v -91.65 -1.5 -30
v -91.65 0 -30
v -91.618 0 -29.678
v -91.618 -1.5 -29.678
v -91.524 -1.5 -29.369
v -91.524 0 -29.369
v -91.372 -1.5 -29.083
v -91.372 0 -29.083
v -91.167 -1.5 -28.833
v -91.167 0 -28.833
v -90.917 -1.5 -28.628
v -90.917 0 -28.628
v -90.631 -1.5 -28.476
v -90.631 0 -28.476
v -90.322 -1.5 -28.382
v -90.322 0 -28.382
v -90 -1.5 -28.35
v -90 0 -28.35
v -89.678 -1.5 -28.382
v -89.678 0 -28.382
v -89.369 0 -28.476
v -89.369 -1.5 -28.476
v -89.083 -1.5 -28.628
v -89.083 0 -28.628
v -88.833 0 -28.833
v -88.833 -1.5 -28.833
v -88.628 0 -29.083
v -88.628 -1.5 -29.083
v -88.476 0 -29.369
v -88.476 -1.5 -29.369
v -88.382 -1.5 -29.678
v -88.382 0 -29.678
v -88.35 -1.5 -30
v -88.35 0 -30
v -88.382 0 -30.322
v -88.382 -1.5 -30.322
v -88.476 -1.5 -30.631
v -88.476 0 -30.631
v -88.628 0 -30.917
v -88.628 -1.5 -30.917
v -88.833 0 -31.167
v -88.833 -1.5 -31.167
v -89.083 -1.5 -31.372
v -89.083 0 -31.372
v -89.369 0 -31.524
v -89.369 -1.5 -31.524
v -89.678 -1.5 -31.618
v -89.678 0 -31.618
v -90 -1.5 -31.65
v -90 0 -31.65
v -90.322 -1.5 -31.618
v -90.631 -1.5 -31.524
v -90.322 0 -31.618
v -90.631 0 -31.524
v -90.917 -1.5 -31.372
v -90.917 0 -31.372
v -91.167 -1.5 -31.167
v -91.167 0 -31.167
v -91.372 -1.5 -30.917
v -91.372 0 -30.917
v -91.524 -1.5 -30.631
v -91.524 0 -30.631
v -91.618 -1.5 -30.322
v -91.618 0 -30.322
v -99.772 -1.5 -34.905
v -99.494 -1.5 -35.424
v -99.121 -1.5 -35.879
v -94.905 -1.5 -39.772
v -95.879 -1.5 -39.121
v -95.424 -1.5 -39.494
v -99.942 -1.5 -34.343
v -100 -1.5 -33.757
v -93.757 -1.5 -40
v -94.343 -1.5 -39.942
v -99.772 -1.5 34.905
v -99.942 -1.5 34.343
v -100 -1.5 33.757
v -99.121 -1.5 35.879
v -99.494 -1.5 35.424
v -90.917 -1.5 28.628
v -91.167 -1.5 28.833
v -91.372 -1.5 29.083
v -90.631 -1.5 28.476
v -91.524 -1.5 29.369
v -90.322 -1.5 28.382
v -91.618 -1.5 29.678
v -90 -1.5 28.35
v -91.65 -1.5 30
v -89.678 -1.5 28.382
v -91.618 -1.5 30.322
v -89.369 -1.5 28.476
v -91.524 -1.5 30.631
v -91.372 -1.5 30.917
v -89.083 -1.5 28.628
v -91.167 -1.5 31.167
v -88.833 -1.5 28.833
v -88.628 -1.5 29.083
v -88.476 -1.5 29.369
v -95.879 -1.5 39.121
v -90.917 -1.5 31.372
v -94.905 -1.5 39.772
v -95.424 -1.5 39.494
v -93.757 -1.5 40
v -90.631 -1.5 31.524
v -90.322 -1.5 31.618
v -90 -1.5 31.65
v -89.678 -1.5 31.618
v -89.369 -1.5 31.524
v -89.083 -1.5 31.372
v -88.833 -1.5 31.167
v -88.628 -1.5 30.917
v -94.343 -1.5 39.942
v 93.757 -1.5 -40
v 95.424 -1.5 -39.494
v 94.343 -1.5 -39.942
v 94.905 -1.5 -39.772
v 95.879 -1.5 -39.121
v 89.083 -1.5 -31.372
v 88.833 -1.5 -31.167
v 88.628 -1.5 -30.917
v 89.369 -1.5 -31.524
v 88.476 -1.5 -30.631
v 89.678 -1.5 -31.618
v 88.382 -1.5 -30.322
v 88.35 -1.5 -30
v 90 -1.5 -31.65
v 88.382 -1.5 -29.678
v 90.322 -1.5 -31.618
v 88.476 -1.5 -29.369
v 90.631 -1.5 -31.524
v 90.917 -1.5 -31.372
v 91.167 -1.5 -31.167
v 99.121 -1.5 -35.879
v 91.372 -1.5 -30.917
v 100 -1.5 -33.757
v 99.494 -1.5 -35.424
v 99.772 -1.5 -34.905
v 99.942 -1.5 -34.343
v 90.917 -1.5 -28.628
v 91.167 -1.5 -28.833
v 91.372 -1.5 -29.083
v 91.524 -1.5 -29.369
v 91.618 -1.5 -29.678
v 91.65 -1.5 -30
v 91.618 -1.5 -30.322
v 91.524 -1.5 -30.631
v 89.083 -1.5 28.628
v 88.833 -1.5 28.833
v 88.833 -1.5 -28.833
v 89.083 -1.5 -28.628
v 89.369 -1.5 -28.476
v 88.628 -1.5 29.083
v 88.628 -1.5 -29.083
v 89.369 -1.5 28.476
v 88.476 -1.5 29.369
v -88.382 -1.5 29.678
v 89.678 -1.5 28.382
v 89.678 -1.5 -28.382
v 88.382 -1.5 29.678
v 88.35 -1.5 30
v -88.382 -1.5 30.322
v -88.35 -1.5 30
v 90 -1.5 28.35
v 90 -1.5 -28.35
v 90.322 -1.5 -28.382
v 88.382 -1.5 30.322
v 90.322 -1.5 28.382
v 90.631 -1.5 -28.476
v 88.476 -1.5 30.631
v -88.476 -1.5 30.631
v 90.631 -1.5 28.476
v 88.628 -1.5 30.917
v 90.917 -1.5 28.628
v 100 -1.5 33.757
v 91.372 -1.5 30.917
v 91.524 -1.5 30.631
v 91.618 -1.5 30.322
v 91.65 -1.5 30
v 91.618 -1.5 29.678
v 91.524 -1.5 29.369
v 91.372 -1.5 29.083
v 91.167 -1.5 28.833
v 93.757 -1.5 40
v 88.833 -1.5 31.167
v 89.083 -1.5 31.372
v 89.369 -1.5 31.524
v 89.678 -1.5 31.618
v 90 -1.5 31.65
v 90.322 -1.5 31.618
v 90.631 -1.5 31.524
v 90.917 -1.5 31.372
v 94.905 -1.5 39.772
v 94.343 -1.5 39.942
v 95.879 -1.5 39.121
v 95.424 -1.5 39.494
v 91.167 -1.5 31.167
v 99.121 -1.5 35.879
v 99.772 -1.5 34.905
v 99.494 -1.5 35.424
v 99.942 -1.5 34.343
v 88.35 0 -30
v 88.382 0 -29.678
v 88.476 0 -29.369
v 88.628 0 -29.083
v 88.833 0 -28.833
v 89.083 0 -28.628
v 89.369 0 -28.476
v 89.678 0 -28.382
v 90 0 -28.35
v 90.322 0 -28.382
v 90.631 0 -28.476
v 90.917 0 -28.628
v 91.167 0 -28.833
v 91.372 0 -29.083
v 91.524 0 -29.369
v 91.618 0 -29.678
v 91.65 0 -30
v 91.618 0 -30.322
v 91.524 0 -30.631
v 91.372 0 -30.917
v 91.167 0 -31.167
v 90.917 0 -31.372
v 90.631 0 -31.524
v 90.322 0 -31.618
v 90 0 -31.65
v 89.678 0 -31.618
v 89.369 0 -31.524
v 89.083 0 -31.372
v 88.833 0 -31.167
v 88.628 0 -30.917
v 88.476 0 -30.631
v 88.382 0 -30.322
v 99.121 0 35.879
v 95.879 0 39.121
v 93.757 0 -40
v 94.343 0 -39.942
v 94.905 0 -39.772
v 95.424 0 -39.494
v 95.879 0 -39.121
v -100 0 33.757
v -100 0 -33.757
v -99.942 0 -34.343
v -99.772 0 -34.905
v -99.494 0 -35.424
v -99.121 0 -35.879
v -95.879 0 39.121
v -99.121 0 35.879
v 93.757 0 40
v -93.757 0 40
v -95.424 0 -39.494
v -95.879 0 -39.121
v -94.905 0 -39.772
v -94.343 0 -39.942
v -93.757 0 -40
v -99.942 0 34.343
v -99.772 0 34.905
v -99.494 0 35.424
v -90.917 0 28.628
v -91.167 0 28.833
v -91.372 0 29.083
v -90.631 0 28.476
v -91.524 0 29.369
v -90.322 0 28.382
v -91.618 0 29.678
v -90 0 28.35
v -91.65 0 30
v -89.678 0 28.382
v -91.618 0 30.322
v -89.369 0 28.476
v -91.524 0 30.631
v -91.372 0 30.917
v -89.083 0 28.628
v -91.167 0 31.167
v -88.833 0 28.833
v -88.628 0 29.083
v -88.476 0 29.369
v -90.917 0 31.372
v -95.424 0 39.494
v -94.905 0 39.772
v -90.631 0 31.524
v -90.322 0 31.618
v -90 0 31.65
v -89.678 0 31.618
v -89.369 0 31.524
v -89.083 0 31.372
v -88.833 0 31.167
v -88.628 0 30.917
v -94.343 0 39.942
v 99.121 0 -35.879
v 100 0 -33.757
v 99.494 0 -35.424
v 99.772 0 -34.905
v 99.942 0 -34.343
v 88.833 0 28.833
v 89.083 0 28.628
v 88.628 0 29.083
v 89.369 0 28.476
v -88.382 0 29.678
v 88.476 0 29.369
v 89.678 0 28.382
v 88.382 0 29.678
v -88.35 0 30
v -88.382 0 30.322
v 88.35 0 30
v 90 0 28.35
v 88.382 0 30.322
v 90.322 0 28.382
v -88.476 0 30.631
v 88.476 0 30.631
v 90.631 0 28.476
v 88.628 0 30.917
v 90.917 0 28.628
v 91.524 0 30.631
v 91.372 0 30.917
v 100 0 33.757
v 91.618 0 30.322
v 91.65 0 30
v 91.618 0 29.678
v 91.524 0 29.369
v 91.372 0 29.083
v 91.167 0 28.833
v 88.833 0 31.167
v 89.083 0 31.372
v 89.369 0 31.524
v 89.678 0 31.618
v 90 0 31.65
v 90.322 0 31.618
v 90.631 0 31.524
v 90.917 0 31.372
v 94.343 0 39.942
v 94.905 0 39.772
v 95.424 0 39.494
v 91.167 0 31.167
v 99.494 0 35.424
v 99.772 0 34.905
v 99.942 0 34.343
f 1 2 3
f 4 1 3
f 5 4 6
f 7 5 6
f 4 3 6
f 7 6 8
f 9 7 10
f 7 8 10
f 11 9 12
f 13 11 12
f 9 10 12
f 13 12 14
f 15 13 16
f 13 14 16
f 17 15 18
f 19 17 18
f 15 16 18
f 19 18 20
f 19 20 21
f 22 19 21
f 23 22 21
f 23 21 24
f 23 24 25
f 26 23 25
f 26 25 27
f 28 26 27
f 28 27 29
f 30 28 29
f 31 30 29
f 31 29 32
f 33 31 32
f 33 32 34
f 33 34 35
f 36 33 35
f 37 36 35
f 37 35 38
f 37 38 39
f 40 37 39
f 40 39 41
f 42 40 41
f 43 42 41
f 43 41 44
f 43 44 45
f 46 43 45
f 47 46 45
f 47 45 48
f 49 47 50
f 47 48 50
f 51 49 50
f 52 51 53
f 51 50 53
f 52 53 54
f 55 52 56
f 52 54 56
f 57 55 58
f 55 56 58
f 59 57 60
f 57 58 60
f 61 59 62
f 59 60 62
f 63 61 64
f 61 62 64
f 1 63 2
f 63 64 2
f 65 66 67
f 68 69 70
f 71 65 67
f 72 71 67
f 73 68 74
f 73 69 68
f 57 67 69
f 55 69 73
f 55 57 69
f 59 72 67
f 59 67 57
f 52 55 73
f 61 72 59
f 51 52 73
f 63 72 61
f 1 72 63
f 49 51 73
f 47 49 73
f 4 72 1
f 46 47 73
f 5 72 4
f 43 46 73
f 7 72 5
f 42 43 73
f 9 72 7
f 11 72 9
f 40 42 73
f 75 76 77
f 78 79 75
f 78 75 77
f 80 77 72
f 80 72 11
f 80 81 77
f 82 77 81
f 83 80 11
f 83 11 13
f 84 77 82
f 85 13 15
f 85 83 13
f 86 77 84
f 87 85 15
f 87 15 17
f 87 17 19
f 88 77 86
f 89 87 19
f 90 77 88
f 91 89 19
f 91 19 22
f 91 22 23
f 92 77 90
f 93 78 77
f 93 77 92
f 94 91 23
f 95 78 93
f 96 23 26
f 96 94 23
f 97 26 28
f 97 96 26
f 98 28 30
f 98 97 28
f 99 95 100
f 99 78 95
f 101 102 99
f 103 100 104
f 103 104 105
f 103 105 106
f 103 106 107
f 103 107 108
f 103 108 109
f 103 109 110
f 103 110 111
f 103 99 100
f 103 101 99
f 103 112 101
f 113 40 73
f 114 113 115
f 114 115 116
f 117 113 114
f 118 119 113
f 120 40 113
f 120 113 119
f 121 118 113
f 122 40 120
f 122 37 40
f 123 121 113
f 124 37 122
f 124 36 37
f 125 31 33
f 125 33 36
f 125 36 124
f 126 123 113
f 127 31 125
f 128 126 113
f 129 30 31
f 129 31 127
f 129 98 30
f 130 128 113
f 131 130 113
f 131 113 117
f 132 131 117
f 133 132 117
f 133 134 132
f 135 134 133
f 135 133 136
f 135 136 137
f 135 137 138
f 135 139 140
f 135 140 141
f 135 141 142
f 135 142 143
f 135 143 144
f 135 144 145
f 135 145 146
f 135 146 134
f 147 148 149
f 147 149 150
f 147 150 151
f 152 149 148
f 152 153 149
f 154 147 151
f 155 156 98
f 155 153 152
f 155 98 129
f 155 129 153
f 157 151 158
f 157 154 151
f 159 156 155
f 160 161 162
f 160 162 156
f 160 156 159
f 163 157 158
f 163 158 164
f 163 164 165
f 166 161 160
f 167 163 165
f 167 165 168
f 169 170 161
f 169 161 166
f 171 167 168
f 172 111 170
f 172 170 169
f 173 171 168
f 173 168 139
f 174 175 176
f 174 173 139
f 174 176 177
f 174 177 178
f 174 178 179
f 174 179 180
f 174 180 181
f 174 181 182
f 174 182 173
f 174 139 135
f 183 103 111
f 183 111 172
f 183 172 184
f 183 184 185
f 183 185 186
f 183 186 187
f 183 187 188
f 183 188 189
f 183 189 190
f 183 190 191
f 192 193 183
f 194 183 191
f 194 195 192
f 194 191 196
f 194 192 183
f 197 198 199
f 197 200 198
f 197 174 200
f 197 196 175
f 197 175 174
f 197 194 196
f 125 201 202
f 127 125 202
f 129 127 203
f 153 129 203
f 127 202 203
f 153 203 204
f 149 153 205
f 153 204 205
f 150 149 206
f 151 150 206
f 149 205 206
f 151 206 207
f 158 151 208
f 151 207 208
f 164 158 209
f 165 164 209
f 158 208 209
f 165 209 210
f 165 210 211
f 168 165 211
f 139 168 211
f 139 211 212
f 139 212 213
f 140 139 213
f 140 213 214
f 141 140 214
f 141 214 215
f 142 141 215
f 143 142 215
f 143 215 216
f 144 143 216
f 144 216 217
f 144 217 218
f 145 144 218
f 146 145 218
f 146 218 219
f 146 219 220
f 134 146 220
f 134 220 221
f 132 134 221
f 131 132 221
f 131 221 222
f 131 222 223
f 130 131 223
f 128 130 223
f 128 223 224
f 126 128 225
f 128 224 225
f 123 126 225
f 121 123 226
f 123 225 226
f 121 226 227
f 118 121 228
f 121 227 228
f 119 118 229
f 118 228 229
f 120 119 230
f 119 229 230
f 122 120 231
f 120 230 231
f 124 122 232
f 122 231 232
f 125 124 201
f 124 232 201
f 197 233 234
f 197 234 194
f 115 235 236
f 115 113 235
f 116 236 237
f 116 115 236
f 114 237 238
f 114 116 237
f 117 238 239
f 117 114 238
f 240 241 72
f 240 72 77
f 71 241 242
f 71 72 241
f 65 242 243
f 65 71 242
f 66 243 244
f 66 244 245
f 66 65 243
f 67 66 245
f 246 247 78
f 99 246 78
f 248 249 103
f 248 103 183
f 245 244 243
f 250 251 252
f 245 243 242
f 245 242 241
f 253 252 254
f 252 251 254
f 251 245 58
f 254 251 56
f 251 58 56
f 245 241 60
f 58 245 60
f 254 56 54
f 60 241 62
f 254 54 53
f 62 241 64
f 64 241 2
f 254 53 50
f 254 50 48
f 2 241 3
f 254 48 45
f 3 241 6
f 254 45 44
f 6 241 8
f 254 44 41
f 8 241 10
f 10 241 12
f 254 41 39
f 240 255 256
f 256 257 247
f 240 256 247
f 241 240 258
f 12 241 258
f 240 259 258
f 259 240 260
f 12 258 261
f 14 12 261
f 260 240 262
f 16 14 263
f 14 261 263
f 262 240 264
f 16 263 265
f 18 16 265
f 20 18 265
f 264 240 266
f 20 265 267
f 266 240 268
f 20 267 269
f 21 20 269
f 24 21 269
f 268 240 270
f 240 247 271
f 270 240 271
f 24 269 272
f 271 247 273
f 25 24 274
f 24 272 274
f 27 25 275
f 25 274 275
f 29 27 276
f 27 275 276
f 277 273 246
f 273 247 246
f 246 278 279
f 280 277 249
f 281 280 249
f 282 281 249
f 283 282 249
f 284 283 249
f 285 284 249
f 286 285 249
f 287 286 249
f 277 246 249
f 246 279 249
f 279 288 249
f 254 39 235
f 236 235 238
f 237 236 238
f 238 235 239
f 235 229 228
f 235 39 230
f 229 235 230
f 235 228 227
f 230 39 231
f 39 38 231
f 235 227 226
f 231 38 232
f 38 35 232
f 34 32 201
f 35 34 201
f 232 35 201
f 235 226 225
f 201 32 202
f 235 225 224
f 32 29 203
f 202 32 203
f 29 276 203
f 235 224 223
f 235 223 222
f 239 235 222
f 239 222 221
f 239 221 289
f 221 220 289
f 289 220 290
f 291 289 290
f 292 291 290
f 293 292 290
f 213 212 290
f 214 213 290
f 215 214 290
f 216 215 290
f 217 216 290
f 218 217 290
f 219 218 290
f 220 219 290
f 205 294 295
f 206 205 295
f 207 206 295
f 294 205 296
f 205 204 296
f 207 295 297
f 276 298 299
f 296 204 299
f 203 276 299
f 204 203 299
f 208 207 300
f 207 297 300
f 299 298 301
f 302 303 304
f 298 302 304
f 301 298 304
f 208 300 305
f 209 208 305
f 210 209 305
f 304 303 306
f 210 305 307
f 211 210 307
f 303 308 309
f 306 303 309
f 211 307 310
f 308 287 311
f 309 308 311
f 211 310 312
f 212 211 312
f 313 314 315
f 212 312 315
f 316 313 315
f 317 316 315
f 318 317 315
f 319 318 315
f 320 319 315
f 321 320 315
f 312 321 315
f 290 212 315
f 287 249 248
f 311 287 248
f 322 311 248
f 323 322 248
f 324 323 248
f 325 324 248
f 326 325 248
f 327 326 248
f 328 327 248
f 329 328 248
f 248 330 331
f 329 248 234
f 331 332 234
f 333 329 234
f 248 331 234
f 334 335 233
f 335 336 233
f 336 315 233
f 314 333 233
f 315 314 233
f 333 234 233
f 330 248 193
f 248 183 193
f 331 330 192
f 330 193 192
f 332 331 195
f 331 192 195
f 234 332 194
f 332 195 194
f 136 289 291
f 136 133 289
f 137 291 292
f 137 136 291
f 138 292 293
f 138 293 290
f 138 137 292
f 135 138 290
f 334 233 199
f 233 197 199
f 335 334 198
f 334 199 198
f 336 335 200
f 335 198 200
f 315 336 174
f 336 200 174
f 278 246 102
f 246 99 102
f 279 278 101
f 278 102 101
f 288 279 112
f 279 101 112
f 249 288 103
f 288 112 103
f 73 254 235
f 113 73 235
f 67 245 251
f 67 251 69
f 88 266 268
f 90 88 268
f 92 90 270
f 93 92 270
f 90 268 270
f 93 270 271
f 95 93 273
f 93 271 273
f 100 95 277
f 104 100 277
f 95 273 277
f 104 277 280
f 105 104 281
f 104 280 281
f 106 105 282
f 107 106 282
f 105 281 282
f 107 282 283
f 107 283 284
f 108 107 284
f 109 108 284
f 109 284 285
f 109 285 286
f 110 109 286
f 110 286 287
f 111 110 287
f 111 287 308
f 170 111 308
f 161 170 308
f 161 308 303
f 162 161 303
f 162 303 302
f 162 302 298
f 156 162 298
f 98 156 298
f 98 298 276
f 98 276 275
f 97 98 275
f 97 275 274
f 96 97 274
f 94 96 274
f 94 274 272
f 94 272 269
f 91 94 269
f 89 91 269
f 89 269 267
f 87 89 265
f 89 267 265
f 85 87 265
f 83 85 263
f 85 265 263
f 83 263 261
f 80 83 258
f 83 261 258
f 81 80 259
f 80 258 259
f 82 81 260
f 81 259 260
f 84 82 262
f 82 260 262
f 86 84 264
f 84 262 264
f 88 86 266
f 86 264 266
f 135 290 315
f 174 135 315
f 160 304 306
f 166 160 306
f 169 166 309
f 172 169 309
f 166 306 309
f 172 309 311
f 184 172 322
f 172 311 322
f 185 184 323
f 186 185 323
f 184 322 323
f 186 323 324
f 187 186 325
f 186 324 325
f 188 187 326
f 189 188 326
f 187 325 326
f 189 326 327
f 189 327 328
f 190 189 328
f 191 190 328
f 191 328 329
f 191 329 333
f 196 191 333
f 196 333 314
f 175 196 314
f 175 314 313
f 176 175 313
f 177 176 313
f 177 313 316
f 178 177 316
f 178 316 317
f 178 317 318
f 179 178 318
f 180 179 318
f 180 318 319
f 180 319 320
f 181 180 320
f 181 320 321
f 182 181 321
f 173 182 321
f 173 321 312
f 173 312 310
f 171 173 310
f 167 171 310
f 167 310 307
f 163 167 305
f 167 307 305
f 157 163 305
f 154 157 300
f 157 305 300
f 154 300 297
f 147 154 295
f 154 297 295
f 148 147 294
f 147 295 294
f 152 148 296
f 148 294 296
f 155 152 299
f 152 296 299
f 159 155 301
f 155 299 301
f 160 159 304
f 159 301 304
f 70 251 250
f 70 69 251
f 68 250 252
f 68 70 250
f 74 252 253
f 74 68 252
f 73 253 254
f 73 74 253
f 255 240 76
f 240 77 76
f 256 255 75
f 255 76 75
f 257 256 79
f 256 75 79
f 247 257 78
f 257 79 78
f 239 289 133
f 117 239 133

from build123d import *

# Parameters (mm, degrees)
F0_W     = 200
F0_H     = 80
F1_DEPTH = 1.5
F2_SIZE  = 5
F4_D     = 3.3
F5_R     = 3


with BuildPart() as f1:
    # F0 (on Front) → F1 (new body)
    with BuildSketch(Plane.XZ):
        Rectangle(F0_W, F0_H)
    extrude(amount=F1_DEPTH)

    # F2
    f2_edges = [f1.edges().sort_by_distance(p)[0] for p in [
        (100, -0.75, 40),
        (-100, -0.75, 40),
        (-100, -0.75, -40),
        (100, -0.75, -40),
    ]]
    chamfer(f2_edges, length=F2_SIZE)

    # F4 (through all)
    with Locations(Plane.XZ.offset(1.5)):
        with Locations((-90, 30), (-90, -30), (90, -30), (90, 30)):
            Hole(F4_D / 2)

    # F5
    f5_edges = [f1.edges().sort_by_distance(p)[0] for p in [
        (95, -0.75, 40),
        (100, -0.75, 35),
        (100, -0.75, -35),
        (95, -0.75, -40),
        (-95, -0.75, -40),
        (-100, -0.75, -35),
        (-100, -0.75, 35),
        (-95, -0.75, 40),
    ]]
    fillet(f5_edges, radius=F5_R)


solid = f1.part
